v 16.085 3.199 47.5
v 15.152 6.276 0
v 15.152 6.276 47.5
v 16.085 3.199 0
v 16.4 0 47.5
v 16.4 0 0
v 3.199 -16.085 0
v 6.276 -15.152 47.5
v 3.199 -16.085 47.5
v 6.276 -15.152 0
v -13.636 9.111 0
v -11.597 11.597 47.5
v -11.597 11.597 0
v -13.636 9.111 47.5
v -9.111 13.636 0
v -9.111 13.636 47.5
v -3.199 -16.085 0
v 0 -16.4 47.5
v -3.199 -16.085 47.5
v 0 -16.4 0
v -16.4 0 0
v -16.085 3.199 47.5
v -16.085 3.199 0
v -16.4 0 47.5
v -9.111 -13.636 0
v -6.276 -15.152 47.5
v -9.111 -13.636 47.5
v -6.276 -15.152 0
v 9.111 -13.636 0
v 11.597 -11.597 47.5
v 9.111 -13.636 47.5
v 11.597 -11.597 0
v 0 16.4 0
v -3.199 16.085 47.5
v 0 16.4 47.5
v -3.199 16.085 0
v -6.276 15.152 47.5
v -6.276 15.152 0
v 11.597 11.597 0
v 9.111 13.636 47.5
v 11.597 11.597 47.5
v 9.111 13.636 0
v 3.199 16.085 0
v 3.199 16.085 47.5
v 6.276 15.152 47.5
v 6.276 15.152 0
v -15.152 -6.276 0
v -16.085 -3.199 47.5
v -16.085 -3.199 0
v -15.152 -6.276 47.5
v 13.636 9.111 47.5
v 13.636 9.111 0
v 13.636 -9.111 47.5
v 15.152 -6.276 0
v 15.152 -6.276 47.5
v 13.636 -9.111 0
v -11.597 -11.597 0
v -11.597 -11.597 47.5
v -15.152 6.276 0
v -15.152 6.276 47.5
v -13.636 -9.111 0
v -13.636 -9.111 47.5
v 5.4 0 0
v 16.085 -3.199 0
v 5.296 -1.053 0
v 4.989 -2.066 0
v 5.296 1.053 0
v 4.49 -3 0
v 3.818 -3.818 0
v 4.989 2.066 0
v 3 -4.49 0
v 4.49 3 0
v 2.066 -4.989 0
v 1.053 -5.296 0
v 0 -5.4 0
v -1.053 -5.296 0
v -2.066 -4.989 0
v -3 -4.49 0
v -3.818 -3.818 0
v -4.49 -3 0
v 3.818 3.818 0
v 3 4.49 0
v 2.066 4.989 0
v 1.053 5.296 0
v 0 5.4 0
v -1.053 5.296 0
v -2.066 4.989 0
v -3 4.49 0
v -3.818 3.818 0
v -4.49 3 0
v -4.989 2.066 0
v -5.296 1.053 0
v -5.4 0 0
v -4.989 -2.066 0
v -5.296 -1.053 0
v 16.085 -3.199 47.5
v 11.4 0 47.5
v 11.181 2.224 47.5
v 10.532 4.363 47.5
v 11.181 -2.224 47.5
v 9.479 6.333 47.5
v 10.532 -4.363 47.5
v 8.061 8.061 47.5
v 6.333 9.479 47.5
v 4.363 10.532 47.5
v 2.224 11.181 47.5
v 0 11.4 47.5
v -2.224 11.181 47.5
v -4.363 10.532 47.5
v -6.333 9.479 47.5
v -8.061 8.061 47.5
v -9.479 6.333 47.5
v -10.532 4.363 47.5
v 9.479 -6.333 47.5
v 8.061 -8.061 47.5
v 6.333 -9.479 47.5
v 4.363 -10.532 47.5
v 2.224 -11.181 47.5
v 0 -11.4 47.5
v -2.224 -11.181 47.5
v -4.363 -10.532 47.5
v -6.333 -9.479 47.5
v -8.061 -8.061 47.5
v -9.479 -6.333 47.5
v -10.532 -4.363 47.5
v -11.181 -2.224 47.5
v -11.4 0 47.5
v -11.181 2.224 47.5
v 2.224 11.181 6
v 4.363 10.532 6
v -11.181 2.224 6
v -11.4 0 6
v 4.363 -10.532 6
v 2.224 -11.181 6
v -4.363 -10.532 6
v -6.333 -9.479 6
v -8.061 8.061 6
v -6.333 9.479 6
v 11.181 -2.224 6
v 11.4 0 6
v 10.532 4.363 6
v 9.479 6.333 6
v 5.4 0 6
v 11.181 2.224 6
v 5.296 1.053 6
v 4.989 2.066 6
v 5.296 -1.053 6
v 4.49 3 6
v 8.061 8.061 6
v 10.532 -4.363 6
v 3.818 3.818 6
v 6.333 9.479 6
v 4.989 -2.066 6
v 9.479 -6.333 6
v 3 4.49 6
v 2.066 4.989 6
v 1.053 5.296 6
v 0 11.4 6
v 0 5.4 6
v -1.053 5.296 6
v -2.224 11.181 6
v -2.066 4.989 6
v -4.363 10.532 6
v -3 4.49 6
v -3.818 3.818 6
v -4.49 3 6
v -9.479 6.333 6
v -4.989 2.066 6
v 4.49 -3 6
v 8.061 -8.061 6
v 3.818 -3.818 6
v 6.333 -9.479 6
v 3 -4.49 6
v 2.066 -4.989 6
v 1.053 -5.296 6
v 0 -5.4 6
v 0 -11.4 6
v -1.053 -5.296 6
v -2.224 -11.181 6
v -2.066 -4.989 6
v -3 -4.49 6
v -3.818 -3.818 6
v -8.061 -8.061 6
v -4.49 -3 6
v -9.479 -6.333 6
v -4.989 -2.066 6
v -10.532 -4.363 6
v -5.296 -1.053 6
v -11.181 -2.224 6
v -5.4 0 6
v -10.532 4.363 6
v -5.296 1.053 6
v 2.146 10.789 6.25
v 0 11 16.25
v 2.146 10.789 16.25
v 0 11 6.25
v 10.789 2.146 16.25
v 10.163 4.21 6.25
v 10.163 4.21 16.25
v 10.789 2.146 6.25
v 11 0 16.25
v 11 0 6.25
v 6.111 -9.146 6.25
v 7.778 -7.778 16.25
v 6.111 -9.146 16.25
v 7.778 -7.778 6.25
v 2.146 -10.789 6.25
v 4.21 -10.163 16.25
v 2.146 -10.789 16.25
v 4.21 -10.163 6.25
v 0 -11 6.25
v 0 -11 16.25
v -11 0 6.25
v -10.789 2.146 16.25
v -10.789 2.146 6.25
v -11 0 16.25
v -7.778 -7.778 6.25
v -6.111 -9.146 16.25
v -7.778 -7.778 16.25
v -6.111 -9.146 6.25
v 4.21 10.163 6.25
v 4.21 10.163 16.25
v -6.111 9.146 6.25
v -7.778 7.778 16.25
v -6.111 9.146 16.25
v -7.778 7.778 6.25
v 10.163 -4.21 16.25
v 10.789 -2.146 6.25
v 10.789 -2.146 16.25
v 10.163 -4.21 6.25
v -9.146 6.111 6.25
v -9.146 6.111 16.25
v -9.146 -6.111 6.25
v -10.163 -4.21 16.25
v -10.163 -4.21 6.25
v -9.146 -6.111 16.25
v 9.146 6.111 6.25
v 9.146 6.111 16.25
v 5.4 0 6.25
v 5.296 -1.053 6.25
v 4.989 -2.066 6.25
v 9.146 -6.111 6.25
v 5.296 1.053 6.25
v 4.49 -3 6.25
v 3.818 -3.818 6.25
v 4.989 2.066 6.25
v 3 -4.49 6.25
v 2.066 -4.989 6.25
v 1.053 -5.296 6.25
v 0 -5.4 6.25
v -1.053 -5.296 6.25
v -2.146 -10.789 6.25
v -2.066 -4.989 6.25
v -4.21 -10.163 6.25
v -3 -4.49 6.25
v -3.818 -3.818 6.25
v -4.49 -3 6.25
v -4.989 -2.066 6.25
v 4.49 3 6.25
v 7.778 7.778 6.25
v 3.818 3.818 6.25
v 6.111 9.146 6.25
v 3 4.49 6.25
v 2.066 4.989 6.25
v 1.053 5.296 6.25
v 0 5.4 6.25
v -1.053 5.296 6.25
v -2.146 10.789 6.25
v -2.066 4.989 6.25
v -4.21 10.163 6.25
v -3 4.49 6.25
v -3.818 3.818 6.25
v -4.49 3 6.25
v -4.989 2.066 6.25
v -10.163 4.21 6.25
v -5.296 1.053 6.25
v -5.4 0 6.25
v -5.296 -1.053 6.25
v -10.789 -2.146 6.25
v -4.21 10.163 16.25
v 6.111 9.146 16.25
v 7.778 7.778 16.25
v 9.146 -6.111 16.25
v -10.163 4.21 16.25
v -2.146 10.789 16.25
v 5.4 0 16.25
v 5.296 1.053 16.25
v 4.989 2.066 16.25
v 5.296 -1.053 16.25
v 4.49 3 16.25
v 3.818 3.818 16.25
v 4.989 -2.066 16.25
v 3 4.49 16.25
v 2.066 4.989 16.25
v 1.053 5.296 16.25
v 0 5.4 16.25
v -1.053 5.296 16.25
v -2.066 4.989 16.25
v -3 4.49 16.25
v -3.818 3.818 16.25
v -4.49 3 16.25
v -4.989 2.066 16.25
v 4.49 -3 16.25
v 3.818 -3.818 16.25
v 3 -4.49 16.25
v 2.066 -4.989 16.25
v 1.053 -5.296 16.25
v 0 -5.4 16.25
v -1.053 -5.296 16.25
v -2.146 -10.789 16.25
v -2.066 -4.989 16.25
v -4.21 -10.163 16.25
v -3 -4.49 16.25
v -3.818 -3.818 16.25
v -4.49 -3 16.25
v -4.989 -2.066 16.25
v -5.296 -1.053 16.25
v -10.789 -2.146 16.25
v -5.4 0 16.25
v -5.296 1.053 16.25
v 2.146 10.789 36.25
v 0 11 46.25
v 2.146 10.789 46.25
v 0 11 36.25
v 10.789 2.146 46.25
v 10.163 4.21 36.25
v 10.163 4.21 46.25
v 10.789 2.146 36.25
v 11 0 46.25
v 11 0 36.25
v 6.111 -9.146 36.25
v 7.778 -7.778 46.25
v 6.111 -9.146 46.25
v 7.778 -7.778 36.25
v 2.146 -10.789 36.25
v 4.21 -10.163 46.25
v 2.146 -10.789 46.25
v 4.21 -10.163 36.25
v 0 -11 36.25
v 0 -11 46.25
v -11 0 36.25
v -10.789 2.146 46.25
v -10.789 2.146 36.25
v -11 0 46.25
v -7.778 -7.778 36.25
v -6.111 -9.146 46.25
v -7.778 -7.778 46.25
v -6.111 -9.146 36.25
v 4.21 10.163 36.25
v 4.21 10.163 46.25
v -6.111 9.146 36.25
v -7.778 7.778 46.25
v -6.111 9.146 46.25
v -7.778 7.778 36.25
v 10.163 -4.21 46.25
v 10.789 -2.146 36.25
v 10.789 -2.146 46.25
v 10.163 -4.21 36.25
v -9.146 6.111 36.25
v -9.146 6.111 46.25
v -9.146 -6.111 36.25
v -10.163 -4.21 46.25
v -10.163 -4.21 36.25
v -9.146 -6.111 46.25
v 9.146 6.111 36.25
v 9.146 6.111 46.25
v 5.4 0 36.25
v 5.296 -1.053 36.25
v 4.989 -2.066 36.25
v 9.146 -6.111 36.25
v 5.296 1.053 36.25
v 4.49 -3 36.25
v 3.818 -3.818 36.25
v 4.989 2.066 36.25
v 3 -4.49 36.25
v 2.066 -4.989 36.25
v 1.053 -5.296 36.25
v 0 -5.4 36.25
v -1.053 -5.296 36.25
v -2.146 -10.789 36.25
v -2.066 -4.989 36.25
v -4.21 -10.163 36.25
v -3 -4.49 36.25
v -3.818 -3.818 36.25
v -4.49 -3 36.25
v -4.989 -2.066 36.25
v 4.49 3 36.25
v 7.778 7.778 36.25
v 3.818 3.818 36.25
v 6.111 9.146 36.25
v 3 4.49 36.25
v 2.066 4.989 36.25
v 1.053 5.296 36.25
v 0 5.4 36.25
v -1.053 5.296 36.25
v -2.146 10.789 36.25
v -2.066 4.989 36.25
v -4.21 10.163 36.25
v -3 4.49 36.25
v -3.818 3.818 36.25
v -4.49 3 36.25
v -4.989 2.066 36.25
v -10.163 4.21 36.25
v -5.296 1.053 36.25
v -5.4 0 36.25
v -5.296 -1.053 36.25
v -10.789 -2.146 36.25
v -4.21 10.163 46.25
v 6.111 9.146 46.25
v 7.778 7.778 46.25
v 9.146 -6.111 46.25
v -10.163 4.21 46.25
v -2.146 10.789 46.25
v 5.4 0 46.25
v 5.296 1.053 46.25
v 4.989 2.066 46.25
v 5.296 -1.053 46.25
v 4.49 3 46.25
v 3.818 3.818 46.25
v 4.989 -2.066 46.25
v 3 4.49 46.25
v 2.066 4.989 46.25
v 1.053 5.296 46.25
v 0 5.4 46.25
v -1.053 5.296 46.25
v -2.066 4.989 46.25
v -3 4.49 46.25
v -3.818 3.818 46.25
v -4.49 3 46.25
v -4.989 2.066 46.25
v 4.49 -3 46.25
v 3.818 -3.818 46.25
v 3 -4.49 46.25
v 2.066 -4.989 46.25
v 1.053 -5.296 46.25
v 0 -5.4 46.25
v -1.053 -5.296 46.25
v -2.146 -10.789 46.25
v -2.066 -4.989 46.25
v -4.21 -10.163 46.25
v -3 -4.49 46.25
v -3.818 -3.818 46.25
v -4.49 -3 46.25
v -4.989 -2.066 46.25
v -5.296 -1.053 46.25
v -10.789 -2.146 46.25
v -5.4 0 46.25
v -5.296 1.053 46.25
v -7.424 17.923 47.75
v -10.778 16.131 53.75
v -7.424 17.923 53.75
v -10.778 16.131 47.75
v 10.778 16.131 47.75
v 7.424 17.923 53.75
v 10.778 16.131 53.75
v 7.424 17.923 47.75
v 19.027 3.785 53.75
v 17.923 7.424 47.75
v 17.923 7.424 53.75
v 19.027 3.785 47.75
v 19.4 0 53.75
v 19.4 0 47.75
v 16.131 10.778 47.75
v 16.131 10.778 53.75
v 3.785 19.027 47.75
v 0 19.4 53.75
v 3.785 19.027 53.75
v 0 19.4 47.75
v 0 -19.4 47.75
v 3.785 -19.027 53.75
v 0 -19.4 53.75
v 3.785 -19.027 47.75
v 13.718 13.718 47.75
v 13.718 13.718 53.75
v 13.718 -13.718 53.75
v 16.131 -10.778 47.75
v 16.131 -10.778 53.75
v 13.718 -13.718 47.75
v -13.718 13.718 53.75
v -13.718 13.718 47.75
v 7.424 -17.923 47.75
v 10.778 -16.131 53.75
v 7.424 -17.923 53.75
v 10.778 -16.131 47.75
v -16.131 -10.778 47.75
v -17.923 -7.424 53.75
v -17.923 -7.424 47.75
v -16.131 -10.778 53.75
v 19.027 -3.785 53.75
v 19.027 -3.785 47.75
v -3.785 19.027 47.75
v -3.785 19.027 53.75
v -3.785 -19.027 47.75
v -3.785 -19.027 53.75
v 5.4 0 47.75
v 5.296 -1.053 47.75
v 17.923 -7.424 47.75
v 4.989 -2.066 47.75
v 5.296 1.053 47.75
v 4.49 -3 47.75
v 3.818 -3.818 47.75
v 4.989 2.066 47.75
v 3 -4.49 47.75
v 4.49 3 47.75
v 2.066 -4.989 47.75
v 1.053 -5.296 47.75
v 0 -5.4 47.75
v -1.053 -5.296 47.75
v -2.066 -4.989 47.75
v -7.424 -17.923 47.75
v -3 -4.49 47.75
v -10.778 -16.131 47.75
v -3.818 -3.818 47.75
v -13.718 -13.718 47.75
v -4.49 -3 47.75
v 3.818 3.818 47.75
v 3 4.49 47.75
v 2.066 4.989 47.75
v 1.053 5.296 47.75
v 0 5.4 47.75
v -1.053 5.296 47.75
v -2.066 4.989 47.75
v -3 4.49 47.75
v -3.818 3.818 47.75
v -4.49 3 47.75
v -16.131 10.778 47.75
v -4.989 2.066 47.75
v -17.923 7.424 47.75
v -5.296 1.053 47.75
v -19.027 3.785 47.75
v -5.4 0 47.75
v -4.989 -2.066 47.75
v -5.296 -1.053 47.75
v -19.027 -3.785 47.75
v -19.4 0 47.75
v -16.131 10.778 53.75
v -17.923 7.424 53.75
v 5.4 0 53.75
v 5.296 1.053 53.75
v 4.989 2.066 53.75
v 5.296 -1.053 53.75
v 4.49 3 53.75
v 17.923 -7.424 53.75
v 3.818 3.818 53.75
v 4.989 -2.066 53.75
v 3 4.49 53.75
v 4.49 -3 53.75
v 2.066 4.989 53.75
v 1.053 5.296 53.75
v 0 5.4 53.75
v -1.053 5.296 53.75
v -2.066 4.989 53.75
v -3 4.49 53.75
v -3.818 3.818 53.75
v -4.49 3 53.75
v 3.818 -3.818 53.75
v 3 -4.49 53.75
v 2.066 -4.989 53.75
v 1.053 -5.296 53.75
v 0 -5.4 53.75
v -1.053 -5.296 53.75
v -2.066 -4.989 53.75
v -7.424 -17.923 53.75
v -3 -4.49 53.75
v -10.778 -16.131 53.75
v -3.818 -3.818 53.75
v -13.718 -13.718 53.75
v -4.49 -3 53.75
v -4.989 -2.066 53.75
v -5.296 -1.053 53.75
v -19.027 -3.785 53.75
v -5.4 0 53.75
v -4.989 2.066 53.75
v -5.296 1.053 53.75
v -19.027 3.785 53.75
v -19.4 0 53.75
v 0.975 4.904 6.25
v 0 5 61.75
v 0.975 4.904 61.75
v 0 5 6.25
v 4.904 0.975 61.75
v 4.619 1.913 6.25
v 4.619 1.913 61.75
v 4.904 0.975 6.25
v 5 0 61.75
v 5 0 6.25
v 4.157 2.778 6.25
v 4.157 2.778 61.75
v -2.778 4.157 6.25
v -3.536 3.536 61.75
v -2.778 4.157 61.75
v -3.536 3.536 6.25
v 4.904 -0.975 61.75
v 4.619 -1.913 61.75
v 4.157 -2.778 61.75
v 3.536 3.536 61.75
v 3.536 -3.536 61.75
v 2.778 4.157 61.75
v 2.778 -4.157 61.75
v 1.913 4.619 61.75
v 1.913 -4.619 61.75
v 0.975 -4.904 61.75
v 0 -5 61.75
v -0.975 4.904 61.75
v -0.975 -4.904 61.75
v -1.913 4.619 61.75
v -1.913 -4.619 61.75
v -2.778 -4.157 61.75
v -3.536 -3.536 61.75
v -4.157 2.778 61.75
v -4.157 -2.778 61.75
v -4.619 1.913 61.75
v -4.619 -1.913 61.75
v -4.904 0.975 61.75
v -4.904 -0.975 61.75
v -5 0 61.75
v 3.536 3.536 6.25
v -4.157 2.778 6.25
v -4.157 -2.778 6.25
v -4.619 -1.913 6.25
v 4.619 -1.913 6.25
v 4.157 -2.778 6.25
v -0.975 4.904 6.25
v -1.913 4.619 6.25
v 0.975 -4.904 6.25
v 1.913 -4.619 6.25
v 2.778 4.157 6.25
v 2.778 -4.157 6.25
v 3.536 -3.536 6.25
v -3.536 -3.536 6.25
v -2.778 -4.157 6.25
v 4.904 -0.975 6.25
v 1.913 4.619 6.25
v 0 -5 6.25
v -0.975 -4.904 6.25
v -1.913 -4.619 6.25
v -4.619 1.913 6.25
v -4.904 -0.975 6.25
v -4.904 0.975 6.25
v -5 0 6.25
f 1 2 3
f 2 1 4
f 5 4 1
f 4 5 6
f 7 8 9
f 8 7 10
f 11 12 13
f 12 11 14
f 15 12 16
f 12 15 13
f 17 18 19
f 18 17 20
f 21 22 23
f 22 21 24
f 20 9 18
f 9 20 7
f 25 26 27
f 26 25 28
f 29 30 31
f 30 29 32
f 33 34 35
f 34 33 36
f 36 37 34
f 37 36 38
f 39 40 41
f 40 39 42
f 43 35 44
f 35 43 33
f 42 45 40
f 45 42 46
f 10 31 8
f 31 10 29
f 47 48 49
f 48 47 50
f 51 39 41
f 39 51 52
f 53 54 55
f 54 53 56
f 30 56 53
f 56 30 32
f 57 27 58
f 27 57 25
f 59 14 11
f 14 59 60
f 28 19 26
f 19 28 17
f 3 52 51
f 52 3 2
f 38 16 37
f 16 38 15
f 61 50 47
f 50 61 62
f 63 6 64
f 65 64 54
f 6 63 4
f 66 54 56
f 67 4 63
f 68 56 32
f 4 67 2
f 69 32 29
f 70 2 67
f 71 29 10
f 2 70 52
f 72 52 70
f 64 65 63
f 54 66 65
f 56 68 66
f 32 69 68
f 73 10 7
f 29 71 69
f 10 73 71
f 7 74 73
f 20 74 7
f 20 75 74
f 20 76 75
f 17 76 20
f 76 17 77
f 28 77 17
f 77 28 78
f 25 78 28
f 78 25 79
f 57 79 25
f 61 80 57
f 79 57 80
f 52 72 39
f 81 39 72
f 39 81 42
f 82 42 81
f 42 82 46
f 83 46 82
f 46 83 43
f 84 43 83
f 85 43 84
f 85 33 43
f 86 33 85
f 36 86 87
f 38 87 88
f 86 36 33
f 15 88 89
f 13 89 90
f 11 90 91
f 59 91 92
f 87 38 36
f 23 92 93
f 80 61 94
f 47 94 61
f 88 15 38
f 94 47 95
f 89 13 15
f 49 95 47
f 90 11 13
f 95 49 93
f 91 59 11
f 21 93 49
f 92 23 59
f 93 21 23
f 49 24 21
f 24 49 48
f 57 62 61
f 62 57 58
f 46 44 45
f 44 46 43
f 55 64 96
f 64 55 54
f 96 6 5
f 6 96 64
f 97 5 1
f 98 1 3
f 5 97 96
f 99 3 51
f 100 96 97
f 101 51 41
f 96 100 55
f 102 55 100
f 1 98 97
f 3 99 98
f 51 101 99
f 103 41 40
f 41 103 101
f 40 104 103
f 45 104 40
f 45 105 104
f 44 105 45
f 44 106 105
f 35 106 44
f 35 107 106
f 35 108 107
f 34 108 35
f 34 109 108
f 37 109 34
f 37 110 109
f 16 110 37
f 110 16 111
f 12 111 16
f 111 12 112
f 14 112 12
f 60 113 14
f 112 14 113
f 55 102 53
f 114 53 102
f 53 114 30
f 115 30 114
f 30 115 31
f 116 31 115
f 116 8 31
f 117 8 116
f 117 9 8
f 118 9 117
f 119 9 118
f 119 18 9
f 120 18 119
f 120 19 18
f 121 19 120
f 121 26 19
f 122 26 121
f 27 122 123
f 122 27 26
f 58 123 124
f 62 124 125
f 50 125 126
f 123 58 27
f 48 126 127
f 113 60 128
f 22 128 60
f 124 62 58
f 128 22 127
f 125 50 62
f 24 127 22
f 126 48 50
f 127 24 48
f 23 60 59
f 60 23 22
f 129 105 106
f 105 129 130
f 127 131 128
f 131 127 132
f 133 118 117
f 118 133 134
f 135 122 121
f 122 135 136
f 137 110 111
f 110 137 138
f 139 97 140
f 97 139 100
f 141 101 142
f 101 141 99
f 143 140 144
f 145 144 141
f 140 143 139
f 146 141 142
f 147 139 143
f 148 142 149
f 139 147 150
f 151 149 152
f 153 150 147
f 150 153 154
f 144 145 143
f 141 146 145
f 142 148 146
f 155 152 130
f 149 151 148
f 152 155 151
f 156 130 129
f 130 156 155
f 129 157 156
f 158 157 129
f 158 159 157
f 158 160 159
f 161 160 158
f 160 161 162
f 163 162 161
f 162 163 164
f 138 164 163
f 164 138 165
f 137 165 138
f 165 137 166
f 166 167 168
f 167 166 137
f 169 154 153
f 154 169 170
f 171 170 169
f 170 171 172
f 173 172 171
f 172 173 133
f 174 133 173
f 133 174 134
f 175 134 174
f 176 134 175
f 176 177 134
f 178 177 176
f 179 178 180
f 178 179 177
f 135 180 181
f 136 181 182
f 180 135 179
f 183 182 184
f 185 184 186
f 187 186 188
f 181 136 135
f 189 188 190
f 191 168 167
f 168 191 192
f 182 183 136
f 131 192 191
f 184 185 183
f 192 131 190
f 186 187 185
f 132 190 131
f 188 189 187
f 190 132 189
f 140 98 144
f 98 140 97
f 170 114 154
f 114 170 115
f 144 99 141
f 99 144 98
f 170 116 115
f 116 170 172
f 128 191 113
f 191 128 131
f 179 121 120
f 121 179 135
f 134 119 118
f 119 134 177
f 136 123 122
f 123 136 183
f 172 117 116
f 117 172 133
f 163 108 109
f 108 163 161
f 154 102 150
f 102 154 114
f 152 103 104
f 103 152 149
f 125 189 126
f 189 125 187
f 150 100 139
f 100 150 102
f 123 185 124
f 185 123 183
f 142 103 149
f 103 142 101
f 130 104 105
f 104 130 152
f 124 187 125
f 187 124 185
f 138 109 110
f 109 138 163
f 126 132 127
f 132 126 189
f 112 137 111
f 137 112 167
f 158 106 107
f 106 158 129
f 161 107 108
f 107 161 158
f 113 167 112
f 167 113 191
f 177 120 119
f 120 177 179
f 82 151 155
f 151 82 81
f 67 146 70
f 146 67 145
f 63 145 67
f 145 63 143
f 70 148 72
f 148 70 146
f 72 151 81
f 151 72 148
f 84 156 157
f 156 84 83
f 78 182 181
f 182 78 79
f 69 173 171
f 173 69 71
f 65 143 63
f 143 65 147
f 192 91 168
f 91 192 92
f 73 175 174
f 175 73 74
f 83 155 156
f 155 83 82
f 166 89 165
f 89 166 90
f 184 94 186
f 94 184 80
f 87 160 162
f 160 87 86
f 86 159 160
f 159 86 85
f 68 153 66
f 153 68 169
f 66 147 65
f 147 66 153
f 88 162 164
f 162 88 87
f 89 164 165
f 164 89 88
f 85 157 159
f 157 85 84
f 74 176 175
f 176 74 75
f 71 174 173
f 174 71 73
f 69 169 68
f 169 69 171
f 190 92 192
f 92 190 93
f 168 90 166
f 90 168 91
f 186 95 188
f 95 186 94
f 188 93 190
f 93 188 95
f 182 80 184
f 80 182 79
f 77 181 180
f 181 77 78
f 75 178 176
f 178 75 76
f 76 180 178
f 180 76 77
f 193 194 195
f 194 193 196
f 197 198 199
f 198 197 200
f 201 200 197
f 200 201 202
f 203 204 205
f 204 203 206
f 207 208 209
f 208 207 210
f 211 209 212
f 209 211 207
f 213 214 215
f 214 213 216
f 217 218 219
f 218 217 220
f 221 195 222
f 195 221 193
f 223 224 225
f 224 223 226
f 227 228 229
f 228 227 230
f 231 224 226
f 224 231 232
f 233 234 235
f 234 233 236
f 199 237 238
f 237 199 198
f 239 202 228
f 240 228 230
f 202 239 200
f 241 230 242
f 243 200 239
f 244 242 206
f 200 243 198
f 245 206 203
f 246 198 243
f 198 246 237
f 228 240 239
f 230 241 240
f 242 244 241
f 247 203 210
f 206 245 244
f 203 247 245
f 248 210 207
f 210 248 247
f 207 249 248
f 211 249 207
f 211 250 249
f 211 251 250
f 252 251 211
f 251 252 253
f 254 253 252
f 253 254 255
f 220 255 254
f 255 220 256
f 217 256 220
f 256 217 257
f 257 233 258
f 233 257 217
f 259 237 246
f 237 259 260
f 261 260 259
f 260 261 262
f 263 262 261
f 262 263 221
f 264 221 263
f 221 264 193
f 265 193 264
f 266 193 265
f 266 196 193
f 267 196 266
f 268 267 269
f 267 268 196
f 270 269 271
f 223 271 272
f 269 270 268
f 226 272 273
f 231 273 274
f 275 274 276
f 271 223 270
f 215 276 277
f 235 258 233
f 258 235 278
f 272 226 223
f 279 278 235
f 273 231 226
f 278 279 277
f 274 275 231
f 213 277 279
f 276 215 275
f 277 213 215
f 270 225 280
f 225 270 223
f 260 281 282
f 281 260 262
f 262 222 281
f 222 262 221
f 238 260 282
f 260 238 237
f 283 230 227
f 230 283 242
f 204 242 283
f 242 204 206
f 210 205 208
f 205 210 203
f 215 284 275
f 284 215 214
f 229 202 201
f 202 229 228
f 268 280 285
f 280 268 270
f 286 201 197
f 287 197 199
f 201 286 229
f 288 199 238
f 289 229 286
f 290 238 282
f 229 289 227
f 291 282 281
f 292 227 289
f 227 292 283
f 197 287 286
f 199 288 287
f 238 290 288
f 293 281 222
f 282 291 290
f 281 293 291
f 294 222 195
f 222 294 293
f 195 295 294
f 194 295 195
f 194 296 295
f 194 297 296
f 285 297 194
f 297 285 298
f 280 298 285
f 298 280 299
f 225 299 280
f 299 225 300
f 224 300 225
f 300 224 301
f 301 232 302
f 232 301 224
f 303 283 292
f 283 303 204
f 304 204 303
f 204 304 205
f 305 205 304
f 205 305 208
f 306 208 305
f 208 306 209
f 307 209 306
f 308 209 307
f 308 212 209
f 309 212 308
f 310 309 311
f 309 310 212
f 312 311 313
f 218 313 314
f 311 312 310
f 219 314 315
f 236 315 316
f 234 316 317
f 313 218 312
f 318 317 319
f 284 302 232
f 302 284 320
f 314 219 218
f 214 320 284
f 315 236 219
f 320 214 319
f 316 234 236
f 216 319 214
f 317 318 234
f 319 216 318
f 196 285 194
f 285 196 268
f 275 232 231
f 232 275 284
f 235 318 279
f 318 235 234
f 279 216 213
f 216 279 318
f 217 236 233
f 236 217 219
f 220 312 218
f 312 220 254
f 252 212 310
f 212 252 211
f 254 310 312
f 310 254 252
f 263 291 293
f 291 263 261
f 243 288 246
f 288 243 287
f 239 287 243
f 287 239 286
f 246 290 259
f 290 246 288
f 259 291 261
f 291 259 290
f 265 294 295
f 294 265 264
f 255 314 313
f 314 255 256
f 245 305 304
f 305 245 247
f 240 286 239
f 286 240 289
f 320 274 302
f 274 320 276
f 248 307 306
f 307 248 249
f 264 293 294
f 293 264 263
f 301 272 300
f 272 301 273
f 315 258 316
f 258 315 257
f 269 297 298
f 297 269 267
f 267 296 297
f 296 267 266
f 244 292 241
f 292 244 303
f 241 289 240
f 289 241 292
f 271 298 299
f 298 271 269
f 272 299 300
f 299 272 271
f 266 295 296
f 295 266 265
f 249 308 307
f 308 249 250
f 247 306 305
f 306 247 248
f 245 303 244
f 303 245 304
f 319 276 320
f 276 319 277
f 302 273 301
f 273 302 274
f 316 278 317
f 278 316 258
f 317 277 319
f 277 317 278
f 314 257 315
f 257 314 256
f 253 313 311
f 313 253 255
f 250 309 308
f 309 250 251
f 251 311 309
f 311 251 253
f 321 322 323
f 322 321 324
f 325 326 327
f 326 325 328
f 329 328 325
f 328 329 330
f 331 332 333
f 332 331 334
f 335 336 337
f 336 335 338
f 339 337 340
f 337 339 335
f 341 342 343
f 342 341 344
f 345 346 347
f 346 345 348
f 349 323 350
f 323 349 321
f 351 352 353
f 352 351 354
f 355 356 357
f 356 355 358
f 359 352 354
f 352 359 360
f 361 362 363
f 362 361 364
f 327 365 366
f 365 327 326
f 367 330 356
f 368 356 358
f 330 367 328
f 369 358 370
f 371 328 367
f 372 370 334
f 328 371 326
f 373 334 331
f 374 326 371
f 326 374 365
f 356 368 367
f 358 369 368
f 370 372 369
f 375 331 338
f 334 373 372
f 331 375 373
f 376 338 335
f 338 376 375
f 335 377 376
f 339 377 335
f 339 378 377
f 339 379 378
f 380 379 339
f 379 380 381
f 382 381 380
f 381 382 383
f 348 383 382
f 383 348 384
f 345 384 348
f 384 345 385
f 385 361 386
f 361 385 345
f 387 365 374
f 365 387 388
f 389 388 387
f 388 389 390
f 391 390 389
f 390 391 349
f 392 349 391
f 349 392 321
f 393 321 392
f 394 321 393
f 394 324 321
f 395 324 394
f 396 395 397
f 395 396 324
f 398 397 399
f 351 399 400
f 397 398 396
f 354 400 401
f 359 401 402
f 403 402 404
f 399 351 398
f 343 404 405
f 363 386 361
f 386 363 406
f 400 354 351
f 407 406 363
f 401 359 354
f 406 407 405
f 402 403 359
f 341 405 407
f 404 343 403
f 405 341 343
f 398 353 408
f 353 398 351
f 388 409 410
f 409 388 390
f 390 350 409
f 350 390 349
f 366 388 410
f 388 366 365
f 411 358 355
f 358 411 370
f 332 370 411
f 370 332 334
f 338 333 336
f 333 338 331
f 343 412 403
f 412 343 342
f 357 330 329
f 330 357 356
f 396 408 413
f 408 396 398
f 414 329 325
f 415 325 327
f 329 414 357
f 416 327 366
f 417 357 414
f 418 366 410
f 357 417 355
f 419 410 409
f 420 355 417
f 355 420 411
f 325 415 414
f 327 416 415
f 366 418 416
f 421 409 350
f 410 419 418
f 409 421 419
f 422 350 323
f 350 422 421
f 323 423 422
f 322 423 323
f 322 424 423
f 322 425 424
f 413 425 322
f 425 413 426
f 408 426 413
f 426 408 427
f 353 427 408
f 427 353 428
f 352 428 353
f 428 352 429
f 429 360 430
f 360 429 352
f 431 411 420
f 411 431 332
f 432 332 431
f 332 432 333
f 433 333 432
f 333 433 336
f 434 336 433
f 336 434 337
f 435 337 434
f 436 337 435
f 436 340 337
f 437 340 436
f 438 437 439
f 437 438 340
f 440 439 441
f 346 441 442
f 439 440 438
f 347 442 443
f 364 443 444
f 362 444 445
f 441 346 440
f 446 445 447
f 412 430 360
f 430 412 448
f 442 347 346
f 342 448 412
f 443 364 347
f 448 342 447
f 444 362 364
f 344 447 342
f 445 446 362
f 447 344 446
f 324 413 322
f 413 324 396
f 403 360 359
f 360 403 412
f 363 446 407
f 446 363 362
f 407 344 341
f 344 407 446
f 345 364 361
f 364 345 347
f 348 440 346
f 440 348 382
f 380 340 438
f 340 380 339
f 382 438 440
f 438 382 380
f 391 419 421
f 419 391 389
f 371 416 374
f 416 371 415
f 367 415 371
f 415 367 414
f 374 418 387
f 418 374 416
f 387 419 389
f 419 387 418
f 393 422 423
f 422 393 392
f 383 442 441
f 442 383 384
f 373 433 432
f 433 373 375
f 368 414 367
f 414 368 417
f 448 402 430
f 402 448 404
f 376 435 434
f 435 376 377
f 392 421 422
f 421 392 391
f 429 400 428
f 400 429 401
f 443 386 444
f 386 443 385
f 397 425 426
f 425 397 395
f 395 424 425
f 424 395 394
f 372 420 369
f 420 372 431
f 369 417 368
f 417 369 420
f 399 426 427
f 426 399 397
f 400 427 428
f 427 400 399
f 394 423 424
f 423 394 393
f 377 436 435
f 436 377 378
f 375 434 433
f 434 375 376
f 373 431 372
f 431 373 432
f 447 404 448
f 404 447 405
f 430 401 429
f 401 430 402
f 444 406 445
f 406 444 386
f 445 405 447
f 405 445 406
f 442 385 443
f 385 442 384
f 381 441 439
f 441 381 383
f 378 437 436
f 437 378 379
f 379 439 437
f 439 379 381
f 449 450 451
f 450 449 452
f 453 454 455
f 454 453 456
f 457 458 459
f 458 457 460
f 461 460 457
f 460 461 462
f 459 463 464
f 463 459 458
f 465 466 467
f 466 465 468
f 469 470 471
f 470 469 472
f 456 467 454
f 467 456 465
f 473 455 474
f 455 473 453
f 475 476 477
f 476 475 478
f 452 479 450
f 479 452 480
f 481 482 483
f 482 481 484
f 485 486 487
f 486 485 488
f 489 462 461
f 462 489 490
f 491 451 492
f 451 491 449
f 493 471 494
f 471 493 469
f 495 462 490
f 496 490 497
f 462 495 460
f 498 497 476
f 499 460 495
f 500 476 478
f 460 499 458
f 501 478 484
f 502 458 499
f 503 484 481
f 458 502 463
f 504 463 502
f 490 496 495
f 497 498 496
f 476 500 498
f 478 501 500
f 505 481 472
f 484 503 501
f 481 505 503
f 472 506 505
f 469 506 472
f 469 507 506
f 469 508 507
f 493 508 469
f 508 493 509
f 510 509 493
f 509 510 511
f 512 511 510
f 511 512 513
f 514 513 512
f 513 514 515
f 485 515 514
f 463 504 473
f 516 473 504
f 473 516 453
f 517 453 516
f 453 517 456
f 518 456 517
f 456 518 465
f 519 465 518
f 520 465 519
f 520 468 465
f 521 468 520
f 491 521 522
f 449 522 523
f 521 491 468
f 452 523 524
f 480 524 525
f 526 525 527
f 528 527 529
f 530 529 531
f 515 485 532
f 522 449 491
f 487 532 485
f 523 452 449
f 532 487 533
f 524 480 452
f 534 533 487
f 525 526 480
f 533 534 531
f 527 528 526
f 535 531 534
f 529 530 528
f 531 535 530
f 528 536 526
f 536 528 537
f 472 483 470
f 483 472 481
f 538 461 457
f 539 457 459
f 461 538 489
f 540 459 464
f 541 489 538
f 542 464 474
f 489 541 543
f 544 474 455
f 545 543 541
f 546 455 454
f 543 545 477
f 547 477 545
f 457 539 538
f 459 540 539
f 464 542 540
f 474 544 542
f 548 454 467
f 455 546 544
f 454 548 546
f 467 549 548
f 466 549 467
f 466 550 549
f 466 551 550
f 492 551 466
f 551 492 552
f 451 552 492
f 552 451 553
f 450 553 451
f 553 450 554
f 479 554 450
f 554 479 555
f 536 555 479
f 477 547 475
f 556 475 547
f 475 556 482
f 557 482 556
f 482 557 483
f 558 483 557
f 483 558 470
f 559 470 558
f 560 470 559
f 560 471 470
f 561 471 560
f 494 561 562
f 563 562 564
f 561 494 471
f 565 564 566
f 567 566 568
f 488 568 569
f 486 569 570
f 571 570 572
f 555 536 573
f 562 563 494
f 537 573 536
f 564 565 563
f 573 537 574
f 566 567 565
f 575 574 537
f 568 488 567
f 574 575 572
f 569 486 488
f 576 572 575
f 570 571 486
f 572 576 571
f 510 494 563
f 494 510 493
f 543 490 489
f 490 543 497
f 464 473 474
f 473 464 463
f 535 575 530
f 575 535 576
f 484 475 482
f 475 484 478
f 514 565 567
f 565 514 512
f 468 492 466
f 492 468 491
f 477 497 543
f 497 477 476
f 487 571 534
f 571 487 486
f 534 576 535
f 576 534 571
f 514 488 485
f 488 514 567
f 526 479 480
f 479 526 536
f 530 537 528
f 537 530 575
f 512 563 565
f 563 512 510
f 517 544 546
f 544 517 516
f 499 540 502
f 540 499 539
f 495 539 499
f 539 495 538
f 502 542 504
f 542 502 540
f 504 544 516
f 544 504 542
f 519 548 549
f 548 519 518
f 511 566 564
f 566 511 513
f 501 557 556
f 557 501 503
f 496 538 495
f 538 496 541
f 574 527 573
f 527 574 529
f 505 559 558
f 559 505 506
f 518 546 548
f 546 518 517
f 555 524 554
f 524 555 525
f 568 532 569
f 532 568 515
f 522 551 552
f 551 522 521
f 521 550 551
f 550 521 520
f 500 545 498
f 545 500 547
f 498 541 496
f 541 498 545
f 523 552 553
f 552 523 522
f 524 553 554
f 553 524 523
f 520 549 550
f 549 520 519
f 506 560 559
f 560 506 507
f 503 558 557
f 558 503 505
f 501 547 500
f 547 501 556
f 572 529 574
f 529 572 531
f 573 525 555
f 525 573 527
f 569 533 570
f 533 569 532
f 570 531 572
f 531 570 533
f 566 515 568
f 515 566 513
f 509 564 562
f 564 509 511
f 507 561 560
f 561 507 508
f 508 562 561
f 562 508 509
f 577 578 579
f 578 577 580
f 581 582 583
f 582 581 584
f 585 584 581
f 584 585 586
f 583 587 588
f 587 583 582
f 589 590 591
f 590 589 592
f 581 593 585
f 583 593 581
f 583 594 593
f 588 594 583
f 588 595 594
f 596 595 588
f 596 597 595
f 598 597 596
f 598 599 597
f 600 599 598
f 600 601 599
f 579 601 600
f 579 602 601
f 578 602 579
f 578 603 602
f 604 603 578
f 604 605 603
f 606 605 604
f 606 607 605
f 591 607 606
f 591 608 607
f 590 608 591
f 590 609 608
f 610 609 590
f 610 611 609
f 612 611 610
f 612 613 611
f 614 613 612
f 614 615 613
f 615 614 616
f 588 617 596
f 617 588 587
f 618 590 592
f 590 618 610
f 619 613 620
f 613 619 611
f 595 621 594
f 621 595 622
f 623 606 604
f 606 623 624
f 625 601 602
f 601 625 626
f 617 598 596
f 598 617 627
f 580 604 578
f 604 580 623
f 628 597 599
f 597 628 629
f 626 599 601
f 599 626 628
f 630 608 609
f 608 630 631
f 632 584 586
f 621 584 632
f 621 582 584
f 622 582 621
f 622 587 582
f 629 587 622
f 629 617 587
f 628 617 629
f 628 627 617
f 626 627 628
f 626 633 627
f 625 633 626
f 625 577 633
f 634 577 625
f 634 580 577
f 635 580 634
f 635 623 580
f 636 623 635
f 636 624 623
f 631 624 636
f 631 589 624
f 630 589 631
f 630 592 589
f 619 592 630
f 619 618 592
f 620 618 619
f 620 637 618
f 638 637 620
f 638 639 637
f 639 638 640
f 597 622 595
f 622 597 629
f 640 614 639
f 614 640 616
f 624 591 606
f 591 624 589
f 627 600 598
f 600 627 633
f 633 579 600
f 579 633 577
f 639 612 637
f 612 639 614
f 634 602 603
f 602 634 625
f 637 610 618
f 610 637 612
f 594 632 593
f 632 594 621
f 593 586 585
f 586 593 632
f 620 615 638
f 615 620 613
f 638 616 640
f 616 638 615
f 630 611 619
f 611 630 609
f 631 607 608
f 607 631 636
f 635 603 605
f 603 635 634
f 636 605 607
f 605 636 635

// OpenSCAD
$fn = 32;

// ------------------------------------------------------------------------
// Shaft station: cup d32.8 x 47.5 mm, shaft d10
// Every part is its own module, assembly() places every instance.
// ------------------------------------------------------------------------

// --- part 1 ---
module housing_cup() {
  difference() {
    cylinder(h = 47.5, d = 32.8);
    translate([0, 0, 6]) cylinder(h = 42.5, d = 22.8);
    translate([0, 0, -1]) cylinder(h = 8, d = 10.8);
  }
}

// --- part 2 ---
module bearing_lower() {
  difference() {
      translate([0, 0, 0]) cylinder(h = 10, d = 22);
      translate([0, 0, -1]) cylinder(h = 12, d = 10.8);
    }
}

// --- part 3 ---
module bearing_upper() {
  difference() {
      translate([0, 0, 0]) cylinder(h = 10, d = 22);
      translate([0, 0, -1]) cylinder(h = 12, d = 10.8);
    }
}

// --- part 4 ---
module station_shaft() {
  translate([0, 0, -27.75]) cylinder(h = 55.5, d = 10);
}

// --- part 5 ---
module station_cover() {
  difference() {
    cylinder(h = 6, d = 38.8);
    translate([0, 0, -1]) cylinder(h = 8, d = 10.8);
  }
}

// --- assembly ---
module assembly() {
  color([0.80, 0.24, 0.20]) translate([0, 0, 0]) rotate([0, 0, 0]) housing_cup();
  color([0.20, 0.45, 0.75]) translate([0, 0, 6.25]) rotate([0, 0, 0]) bearing_lower();
  color([0.25, 0.62, 0.32]) translate([0, 0, 36.25]) rotate([0, 0, 0]) bearing_upper();
  color([0.92, 0.70, 0.18]) translate([0, 0, 34]) rotate([0, 0, 0]) station_shaft();
  color([0.58, 0.35, 0.70]) translate([0, 0, 47.75]) rotate([0, 0, 0]) station_cover();
}

assembly();
